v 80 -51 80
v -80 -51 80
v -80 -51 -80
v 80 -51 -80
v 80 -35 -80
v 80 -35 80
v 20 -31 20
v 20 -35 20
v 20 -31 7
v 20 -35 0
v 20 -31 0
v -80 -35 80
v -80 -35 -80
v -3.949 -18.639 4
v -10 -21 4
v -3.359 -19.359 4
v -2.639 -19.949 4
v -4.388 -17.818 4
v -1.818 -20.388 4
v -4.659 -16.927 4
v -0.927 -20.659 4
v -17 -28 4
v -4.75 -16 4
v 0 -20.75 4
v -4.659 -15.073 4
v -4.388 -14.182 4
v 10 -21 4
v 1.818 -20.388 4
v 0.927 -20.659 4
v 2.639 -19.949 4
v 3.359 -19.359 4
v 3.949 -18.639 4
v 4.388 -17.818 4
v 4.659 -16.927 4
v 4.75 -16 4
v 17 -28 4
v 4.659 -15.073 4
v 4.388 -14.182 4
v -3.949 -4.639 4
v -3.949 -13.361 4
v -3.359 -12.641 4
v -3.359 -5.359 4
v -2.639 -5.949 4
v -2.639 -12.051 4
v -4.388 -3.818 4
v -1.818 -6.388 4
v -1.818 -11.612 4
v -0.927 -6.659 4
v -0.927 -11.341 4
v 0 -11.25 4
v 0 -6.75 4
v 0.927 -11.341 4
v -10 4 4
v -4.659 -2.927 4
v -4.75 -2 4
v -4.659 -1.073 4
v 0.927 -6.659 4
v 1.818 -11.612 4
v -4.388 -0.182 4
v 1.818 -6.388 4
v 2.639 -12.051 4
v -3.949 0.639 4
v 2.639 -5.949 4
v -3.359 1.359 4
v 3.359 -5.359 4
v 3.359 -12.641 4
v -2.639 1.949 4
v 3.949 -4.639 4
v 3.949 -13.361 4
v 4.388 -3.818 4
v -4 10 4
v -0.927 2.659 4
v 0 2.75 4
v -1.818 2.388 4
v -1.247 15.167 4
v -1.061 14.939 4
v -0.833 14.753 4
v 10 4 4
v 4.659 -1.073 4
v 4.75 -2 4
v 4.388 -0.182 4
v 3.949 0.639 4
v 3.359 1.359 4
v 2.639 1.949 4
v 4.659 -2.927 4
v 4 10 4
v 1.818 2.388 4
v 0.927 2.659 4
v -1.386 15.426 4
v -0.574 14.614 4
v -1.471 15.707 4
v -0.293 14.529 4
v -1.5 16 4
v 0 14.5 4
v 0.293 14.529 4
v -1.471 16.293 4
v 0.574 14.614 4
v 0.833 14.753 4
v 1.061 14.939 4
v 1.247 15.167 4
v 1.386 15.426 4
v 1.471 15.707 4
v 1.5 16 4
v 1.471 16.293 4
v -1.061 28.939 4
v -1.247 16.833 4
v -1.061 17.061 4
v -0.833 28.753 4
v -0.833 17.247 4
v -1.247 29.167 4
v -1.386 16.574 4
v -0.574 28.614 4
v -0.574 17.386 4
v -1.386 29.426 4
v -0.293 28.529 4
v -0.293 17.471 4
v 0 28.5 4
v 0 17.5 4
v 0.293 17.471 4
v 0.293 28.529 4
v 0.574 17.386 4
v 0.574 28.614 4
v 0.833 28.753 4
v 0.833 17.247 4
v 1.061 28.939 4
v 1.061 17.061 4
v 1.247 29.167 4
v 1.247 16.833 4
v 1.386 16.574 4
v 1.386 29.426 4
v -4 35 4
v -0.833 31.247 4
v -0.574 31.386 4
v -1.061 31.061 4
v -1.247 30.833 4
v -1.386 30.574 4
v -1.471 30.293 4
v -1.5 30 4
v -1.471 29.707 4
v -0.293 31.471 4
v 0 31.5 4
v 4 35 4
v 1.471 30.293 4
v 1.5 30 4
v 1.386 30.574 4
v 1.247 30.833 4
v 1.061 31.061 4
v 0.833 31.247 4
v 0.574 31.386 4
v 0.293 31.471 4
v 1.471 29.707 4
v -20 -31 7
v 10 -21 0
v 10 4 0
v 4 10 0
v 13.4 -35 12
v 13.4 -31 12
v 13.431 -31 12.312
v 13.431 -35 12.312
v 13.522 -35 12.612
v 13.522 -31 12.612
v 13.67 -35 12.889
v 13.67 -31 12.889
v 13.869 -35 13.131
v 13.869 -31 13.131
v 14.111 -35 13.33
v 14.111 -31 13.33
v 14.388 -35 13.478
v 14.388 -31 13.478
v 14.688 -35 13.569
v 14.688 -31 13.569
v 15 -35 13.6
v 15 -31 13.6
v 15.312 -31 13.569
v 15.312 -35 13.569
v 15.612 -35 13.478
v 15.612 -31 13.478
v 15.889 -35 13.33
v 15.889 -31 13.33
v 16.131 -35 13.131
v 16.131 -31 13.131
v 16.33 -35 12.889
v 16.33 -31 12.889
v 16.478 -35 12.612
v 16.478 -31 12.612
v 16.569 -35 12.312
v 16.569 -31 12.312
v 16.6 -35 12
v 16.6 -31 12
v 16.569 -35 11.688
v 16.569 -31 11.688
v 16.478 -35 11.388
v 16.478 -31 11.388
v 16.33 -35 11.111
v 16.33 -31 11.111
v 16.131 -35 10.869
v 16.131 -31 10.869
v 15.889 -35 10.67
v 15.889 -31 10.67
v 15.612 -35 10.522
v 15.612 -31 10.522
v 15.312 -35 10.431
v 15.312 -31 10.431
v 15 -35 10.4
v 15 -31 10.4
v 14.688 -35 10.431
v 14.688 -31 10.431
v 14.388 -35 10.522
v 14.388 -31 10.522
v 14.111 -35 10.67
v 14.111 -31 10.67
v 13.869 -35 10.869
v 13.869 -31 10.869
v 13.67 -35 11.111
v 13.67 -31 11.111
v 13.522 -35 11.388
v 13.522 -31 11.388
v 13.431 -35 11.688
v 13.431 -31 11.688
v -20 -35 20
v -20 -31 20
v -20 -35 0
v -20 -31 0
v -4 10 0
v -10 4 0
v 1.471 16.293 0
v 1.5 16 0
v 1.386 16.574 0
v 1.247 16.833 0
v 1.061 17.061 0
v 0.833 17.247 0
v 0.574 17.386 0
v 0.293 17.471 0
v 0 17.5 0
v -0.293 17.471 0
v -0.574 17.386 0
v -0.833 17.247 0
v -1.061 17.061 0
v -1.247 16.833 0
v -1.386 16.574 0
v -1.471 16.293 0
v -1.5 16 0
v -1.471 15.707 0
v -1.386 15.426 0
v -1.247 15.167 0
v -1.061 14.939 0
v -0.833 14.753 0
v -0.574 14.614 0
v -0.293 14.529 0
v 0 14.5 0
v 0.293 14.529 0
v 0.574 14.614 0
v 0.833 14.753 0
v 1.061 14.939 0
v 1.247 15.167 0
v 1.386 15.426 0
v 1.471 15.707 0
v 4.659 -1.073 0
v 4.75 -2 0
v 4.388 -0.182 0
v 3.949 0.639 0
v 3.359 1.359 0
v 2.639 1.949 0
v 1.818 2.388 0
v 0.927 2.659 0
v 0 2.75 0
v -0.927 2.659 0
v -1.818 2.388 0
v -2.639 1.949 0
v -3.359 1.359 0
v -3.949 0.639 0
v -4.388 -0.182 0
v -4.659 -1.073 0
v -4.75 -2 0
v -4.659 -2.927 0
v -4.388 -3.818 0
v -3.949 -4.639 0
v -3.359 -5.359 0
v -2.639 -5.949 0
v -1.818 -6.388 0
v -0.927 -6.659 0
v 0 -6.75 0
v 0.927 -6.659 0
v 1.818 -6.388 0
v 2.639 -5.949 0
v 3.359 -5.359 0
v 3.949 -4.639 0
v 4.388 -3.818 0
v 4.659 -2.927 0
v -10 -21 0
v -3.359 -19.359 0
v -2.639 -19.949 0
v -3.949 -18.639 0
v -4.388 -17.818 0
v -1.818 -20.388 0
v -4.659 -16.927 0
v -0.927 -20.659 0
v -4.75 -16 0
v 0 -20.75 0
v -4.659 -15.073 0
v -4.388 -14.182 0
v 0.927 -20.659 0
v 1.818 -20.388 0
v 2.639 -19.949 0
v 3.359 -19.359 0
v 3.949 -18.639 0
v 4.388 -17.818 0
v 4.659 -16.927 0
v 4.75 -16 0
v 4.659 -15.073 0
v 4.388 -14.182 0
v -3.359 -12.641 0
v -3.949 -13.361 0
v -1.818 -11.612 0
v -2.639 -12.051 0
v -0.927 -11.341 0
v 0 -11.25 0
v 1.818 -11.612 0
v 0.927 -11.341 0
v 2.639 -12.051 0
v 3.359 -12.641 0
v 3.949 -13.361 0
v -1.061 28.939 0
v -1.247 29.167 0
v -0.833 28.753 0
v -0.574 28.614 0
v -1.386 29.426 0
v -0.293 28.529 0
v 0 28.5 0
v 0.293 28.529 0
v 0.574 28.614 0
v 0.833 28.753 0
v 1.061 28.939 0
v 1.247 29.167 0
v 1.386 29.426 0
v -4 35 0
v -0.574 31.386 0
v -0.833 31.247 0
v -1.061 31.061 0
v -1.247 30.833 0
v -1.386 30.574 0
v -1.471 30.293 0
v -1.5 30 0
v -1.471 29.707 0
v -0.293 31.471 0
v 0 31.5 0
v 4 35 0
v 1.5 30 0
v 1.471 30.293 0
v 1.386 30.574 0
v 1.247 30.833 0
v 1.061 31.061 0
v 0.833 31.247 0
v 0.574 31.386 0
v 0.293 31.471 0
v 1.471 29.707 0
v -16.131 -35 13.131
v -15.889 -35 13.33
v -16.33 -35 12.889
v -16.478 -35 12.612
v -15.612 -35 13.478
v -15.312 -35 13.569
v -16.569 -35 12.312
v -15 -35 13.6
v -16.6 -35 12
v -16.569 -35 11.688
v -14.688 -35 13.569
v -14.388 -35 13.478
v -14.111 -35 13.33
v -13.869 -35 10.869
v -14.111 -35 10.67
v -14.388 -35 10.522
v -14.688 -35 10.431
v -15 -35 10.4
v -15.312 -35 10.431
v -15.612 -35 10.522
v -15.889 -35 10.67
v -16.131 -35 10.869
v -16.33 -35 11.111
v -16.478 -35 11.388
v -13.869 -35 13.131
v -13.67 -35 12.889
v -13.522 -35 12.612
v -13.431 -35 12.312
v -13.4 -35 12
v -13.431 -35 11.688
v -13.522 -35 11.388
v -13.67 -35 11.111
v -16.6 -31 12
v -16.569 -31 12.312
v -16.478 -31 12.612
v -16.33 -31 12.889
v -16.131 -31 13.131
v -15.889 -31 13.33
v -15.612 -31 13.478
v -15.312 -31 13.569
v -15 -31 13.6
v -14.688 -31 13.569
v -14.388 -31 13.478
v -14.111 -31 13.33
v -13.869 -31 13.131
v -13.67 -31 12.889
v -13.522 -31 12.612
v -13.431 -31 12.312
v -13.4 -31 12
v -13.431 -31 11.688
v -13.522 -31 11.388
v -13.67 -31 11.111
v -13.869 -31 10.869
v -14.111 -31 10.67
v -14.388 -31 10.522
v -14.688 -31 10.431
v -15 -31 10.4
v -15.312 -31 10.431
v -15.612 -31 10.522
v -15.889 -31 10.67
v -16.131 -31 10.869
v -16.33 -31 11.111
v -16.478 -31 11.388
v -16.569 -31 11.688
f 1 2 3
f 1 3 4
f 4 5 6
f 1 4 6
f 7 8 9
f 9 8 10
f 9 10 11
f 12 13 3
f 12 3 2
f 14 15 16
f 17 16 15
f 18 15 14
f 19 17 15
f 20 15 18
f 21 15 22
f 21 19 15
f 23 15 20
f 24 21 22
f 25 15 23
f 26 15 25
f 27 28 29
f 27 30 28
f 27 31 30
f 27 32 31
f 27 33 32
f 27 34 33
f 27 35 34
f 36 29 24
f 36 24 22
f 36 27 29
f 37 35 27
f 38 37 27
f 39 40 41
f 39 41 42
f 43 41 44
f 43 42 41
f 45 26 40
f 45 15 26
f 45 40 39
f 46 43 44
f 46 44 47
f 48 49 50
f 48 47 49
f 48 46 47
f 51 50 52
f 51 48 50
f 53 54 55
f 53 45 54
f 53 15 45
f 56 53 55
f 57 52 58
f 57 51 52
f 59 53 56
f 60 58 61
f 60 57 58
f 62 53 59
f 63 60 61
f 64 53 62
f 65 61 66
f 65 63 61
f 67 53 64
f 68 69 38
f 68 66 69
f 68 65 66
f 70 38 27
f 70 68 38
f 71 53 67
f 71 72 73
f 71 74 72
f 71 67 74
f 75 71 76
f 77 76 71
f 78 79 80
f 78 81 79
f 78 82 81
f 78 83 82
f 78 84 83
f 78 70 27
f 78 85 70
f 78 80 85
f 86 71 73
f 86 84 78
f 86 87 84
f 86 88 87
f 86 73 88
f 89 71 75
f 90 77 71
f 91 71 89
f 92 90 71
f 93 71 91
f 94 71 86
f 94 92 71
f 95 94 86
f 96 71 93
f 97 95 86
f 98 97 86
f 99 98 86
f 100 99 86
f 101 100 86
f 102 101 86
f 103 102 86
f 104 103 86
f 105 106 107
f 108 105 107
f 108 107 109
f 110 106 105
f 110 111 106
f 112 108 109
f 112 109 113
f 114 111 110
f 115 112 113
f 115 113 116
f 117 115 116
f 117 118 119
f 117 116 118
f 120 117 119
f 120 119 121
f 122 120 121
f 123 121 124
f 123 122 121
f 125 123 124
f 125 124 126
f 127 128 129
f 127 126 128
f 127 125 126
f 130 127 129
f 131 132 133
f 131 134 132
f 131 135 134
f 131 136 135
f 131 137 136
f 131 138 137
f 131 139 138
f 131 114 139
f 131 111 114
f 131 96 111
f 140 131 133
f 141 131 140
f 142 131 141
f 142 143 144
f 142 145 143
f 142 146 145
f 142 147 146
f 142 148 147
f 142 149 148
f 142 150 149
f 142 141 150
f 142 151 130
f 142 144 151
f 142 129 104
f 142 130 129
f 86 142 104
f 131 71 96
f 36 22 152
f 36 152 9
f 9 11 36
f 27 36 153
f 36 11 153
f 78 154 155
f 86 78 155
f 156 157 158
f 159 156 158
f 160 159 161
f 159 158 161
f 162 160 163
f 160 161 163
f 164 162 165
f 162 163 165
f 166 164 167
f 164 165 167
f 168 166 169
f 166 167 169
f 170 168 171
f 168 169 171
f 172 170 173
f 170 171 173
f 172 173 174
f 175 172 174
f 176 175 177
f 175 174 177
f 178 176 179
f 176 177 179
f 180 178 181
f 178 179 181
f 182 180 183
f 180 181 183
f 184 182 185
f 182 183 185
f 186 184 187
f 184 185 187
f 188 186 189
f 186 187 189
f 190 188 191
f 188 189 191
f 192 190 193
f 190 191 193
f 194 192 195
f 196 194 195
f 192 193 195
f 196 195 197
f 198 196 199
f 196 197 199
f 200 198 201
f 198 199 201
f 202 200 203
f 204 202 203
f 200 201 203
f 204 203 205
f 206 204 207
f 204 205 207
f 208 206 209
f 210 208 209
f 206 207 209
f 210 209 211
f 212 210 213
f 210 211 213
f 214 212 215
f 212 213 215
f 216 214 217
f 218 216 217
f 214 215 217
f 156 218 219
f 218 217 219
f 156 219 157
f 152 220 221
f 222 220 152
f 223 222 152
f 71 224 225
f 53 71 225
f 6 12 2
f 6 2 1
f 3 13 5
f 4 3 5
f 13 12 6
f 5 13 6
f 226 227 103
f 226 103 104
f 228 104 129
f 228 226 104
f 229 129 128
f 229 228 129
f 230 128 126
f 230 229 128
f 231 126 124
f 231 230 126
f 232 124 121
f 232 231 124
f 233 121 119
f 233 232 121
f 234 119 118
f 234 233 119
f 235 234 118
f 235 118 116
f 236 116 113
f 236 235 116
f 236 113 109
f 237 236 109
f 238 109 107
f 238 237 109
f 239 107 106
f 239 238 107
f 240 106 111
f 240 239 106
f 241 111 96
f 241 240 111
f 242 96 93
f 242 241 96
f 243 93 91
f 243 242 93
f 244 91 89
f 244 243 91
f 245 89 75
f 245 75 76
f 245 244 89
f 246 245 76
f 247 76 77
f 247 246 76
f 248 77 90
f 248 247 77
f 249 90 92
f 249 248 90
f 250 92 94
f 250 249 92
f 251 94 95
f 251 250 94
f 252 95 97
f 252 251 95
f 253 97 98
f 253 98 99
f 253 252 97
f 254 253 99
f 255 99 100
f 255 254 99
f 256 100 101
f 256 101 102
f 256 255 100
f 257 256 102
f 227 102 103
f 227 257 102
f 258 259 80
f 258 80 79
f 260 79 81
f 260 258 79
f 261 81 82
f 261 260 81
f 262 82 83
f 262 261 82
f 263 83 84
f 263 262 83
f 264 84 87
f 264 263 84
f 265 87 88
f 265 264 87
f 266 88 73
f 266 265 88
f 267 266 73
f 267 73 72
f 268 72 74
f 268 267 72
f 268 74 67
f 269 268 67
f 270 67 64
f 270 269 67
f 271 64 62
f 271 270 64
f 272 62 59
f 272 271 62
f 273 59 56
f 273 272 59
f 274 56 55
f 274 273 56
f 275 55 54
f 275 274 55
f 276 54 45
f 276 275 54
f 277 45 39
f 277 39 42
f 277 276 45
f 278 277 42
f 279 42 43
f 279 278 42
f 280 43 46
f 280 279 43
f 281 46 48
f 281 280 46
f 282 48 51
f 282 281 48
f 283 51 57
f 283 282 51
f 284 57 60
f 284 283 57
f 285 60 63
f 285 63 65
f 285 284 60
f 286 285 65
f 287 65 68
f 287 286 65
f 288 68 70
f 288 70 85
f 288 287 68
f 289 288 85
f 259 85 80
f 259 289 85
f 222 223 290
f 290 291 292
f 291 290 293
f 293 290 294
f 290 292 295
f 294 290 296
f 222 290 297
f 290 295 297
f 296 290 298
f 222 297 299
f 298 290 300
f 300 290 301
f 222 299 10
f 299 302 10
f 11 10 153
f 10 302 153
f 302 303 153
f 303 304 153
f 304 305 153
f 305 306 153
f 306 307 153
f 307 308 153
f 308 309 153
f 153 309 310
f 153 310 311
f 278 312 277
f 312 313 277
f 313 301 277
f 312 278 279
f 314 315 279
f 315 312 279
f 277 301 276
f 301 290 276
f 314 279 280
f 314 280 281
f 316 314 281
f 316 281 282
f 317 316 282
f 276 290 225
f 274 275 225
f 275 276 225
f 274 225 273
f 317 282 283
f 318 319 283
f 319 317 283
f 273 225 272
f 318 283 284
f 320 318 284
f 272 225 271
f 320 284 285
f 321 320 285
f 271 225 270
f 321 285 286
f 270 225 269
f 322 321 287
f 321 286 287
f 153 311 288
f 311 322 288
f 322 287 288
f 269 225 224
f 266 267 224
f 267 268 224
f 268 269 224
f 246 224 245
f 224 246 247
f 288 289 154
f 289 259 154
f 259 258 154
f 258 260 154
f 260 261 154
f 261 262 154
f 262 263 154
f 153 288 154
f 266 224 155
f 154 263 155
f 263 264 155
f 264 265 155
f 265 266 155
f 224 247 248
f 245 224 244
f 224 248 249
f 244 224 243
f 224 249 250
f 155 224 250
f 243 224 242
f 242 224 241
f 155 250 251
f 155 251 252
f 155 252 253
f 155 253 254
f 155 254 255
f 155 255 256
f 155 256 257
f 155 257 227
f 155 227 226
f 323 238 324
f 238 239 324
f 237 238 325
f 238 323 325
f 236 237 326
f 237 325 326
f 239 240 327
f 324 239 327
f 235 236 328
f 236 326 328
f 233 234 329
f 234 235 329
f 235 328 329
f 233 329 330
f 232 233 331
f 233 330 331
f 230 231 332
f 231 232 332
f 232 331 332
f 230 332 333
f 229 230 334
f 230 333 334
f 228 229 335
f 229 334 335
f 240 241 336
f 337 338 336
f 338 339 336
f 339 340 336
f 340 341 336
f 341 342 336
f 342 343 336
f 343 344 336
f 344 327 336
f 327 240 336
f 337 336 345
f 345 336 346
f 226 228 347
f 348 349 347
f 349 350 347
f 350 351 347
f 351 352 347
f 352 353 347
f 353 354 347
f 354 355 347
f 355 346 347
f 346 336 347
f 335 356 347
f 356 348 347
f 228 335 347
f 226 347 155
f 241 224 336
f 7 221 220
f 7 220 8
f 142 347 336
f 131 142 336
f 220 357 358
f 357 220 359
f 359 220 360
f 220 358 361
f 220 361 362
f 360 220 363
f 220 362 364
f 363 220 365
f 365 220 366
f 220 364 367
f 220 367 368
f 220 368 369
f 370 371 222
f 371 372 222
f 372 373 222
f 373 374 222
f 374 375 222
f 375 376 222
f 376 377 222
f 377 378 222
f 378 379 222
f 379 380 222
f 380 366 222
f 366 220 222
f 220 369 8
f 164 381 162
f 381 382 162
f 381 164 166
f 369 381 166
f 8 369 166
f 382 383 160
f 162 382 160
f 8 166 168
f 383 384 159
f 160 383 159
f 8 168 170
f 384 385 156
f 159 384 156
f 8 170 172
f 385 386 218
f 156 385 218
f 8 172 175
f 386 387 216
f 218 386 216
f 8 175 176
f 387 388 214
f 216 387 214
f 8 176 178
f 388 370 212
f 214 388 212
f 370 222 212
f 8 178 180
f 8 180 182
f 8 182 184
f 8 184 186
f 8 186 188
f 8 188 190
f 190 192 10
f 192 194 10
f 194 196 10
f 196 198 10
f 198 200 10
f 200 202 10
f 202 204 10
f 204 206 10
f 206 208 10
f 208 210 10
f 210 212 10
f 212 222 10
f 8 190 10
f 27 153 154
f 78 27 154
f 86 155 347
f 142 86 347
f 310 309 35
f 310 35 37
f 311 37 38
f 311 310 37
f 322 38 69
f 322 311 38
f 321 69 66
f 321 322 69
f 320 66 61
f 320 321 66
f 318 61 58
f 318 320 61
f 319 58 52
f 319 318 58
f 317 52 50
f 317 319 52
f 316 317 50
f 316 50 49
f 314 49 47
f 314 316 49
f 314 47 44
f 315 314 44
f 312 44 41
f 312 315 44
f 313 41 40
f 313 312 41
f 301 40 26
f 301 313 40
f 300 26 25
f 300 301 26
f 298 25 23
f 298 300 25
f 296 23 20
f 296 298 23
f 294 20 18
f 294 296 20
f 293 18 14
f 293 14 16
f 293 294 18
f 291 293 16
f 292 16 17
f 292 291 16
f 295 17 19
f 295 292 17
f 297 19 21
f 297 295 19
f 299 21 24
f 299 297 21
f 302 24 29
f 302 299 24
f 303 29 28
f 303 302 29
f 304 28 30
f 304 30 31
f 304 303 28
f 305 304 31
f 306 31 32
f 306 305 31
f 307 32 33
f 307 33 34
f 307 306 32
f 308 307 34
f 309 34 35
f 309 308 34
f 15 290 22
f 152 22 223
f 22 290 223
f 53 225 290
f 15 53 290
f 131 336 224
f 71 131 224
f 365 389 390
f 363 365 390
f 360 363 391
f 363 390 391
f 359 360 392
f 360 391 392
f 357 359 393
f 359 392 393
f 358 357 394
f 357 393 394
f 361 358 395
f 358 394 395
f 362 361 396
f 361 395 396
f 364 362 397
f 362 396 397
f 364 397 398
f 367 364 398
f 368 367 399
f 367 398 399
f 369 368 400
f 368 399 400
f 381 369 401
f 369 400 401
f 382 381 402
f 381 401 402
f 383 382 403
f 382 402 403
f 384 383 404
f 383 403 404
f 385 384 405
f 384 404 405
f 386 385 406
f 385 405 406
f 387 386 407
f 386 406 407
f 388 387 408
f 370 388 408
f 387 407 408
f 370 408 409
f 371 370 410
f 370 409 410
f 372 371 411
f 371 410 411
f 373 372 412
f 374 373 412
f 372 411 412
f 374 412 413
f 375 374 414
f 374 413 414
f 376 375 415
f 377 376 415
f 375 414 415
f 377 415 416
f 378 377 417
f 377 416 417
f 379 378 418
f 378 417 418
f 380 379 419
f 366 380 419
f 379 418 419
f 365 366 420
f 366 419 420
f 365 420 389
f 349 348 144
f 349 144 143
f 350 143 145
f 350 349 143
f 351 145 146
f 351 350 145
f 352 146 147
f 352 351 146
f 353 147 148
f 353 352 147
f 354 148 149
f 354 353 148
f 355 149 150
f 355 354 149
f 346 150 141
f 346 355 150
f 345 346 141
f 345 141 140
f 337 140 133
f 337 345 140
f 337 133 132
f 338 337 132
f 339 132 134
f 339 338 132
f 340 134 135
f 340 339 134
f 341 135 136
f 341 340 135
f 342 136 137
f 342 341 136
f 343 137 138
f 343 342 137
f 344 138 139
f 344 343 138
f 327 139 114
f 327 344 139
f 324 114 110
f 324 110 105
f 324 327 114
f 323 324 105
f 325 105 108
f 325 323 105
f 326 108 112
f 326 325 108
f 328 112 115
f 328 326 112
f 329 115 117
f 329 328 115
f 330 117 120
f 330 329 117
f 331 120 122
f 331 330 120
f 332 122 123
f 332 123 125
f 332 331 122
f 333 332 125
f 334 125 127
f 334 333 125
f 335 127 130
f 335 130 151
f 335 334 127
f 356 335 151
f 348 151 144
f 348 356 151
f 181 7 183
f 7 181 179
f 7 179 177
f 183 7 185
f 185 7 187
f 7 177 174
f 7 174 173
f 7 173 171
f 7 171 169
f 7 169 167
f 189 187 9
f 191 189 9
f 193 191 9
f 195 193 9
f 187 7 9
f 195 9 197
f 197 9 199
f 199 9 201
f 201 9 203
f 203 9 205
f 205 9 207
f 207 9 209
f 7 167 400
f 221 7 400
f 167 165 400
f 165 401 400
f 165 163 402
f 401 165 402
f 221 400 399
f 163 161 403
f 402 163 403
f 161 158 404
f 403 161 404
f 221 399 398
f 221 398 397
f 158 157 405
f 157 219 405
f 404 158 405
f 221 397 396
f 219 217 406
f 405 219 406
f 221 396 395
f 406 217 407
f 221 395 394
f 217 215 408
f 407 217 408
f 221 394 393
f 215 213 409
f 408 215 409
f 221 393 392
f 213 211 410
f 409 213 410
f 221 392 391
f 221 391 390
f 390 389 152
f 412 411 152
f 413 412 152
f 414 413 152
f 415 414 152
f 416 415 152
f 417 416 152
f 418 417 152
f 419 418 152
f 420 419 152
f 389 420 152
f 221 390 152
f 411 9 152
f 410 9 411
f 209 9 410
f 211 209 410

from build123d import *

# Parameters (mm, degrees)
F0_R     = 4.75
F0_R_2   = 1.5
F1_DEPTH = 4
F0_W     = 20
F0_H     = 4
F0_W_2   = 10
F2_DEPTH = 20
F3_R     = 1.6
F4_DEPTH = 4
F5_SIZE  = 3
F6_W     = 160
F6_H     = 160
F6_W_2   = 40
F6_H_2   = 20
F6_R     = 1.6
F7_DEPTH = 16


with BuildPart() as f1:
    # F0 (on Top) → F1 (new body)
    with BuildSketch(Plane.XY):
        Polygon((4, 35), (-4, 35), (-4, 10), (-10, 4), (-10, -21), (-10, -31), (10, -31), (10, -21), (10, 4), (4, 10), align=None)
        with Locations((0, -16)):
            Circle(F0_R, mode=Mode.SUBTRACT)
        with Locations((0, -2)):
            Circle(F0_R, mode=Mode.SUBTRACT)
        with Locations((0, 16)):
            Circle(F0_R_2, mode=Mode.SUBTRACT)
        with Locations((0, 30)):
            Circle(F0_R_2, mode=Mode.SUBTRACT)
        Polygon((-10, -31), (-10, -21), (-20, -31), align=None)
        Polygon((20, -31), (10, -21), (10, -31), align=None)
    extrude(amount=F1_DEPTH)

    # F0 (on Top) → F2 (join)
    with BuildSketch(Plane.XY):
        with Locations((0, -33)):
            Rectangle(F0_W, F0_H)
        with Locations((-15, -33)):
            Rectangle(F0_W_2, F0_H)
        with Locations((15, -33)):
            Rectangle(F0_W_2, F0_H)
    extrude(amount=F2_DEPTH)

    # F3 (on face) → F4 (cut, through all)
    with BuildSketch(Plane(origin=(0, -31, 0), x_dir=(-1, 0, 0), z_dir=(0, 1, 0))):
        with Locations((-15, 12)):
            Circle(F3_R)
        with Locations((15, 12)):
            Circle(F3_R)
    extrude(amount=-F4_DEPTH, mode=Mode.SUBTRACT)

    # F5
    f5_edges = [f1.edges().sort_by_distance(p)[0] for p in [
        (0, -31, 4),
    ]]
    chamfer(f5_edges, length=F5_SIZE)


with BuildPart() as f7:
    # F6 (on face) → F7 (new body)
    with BuildSketch(Plane.XZ.offset(35)):
        Rectangle(F6_W, F6_H)
        with Locations((0, 10)):
            Rectangle(F6_W_2, F6_H_2, mode=Mode.SUBTRACT)
        with Locations((0, 10)):
            Rectangle(F6_W_2, F6_H_2)
        with Locations((-15, 12)):
            Circle(F6_R, mode=Mode.SUBTRACT)
        with Locations((15, 12)):
            Circle(F6_R, mode=Mode.SUBTRACT)
        with Locations((-15, 12)):
            Circle(F6_R)
        with Locations((15, 12)):
            Circle(F6_R)
    extrude(amount=F7_DEPTH)


solid = Compound([f1.part, f7.part])
